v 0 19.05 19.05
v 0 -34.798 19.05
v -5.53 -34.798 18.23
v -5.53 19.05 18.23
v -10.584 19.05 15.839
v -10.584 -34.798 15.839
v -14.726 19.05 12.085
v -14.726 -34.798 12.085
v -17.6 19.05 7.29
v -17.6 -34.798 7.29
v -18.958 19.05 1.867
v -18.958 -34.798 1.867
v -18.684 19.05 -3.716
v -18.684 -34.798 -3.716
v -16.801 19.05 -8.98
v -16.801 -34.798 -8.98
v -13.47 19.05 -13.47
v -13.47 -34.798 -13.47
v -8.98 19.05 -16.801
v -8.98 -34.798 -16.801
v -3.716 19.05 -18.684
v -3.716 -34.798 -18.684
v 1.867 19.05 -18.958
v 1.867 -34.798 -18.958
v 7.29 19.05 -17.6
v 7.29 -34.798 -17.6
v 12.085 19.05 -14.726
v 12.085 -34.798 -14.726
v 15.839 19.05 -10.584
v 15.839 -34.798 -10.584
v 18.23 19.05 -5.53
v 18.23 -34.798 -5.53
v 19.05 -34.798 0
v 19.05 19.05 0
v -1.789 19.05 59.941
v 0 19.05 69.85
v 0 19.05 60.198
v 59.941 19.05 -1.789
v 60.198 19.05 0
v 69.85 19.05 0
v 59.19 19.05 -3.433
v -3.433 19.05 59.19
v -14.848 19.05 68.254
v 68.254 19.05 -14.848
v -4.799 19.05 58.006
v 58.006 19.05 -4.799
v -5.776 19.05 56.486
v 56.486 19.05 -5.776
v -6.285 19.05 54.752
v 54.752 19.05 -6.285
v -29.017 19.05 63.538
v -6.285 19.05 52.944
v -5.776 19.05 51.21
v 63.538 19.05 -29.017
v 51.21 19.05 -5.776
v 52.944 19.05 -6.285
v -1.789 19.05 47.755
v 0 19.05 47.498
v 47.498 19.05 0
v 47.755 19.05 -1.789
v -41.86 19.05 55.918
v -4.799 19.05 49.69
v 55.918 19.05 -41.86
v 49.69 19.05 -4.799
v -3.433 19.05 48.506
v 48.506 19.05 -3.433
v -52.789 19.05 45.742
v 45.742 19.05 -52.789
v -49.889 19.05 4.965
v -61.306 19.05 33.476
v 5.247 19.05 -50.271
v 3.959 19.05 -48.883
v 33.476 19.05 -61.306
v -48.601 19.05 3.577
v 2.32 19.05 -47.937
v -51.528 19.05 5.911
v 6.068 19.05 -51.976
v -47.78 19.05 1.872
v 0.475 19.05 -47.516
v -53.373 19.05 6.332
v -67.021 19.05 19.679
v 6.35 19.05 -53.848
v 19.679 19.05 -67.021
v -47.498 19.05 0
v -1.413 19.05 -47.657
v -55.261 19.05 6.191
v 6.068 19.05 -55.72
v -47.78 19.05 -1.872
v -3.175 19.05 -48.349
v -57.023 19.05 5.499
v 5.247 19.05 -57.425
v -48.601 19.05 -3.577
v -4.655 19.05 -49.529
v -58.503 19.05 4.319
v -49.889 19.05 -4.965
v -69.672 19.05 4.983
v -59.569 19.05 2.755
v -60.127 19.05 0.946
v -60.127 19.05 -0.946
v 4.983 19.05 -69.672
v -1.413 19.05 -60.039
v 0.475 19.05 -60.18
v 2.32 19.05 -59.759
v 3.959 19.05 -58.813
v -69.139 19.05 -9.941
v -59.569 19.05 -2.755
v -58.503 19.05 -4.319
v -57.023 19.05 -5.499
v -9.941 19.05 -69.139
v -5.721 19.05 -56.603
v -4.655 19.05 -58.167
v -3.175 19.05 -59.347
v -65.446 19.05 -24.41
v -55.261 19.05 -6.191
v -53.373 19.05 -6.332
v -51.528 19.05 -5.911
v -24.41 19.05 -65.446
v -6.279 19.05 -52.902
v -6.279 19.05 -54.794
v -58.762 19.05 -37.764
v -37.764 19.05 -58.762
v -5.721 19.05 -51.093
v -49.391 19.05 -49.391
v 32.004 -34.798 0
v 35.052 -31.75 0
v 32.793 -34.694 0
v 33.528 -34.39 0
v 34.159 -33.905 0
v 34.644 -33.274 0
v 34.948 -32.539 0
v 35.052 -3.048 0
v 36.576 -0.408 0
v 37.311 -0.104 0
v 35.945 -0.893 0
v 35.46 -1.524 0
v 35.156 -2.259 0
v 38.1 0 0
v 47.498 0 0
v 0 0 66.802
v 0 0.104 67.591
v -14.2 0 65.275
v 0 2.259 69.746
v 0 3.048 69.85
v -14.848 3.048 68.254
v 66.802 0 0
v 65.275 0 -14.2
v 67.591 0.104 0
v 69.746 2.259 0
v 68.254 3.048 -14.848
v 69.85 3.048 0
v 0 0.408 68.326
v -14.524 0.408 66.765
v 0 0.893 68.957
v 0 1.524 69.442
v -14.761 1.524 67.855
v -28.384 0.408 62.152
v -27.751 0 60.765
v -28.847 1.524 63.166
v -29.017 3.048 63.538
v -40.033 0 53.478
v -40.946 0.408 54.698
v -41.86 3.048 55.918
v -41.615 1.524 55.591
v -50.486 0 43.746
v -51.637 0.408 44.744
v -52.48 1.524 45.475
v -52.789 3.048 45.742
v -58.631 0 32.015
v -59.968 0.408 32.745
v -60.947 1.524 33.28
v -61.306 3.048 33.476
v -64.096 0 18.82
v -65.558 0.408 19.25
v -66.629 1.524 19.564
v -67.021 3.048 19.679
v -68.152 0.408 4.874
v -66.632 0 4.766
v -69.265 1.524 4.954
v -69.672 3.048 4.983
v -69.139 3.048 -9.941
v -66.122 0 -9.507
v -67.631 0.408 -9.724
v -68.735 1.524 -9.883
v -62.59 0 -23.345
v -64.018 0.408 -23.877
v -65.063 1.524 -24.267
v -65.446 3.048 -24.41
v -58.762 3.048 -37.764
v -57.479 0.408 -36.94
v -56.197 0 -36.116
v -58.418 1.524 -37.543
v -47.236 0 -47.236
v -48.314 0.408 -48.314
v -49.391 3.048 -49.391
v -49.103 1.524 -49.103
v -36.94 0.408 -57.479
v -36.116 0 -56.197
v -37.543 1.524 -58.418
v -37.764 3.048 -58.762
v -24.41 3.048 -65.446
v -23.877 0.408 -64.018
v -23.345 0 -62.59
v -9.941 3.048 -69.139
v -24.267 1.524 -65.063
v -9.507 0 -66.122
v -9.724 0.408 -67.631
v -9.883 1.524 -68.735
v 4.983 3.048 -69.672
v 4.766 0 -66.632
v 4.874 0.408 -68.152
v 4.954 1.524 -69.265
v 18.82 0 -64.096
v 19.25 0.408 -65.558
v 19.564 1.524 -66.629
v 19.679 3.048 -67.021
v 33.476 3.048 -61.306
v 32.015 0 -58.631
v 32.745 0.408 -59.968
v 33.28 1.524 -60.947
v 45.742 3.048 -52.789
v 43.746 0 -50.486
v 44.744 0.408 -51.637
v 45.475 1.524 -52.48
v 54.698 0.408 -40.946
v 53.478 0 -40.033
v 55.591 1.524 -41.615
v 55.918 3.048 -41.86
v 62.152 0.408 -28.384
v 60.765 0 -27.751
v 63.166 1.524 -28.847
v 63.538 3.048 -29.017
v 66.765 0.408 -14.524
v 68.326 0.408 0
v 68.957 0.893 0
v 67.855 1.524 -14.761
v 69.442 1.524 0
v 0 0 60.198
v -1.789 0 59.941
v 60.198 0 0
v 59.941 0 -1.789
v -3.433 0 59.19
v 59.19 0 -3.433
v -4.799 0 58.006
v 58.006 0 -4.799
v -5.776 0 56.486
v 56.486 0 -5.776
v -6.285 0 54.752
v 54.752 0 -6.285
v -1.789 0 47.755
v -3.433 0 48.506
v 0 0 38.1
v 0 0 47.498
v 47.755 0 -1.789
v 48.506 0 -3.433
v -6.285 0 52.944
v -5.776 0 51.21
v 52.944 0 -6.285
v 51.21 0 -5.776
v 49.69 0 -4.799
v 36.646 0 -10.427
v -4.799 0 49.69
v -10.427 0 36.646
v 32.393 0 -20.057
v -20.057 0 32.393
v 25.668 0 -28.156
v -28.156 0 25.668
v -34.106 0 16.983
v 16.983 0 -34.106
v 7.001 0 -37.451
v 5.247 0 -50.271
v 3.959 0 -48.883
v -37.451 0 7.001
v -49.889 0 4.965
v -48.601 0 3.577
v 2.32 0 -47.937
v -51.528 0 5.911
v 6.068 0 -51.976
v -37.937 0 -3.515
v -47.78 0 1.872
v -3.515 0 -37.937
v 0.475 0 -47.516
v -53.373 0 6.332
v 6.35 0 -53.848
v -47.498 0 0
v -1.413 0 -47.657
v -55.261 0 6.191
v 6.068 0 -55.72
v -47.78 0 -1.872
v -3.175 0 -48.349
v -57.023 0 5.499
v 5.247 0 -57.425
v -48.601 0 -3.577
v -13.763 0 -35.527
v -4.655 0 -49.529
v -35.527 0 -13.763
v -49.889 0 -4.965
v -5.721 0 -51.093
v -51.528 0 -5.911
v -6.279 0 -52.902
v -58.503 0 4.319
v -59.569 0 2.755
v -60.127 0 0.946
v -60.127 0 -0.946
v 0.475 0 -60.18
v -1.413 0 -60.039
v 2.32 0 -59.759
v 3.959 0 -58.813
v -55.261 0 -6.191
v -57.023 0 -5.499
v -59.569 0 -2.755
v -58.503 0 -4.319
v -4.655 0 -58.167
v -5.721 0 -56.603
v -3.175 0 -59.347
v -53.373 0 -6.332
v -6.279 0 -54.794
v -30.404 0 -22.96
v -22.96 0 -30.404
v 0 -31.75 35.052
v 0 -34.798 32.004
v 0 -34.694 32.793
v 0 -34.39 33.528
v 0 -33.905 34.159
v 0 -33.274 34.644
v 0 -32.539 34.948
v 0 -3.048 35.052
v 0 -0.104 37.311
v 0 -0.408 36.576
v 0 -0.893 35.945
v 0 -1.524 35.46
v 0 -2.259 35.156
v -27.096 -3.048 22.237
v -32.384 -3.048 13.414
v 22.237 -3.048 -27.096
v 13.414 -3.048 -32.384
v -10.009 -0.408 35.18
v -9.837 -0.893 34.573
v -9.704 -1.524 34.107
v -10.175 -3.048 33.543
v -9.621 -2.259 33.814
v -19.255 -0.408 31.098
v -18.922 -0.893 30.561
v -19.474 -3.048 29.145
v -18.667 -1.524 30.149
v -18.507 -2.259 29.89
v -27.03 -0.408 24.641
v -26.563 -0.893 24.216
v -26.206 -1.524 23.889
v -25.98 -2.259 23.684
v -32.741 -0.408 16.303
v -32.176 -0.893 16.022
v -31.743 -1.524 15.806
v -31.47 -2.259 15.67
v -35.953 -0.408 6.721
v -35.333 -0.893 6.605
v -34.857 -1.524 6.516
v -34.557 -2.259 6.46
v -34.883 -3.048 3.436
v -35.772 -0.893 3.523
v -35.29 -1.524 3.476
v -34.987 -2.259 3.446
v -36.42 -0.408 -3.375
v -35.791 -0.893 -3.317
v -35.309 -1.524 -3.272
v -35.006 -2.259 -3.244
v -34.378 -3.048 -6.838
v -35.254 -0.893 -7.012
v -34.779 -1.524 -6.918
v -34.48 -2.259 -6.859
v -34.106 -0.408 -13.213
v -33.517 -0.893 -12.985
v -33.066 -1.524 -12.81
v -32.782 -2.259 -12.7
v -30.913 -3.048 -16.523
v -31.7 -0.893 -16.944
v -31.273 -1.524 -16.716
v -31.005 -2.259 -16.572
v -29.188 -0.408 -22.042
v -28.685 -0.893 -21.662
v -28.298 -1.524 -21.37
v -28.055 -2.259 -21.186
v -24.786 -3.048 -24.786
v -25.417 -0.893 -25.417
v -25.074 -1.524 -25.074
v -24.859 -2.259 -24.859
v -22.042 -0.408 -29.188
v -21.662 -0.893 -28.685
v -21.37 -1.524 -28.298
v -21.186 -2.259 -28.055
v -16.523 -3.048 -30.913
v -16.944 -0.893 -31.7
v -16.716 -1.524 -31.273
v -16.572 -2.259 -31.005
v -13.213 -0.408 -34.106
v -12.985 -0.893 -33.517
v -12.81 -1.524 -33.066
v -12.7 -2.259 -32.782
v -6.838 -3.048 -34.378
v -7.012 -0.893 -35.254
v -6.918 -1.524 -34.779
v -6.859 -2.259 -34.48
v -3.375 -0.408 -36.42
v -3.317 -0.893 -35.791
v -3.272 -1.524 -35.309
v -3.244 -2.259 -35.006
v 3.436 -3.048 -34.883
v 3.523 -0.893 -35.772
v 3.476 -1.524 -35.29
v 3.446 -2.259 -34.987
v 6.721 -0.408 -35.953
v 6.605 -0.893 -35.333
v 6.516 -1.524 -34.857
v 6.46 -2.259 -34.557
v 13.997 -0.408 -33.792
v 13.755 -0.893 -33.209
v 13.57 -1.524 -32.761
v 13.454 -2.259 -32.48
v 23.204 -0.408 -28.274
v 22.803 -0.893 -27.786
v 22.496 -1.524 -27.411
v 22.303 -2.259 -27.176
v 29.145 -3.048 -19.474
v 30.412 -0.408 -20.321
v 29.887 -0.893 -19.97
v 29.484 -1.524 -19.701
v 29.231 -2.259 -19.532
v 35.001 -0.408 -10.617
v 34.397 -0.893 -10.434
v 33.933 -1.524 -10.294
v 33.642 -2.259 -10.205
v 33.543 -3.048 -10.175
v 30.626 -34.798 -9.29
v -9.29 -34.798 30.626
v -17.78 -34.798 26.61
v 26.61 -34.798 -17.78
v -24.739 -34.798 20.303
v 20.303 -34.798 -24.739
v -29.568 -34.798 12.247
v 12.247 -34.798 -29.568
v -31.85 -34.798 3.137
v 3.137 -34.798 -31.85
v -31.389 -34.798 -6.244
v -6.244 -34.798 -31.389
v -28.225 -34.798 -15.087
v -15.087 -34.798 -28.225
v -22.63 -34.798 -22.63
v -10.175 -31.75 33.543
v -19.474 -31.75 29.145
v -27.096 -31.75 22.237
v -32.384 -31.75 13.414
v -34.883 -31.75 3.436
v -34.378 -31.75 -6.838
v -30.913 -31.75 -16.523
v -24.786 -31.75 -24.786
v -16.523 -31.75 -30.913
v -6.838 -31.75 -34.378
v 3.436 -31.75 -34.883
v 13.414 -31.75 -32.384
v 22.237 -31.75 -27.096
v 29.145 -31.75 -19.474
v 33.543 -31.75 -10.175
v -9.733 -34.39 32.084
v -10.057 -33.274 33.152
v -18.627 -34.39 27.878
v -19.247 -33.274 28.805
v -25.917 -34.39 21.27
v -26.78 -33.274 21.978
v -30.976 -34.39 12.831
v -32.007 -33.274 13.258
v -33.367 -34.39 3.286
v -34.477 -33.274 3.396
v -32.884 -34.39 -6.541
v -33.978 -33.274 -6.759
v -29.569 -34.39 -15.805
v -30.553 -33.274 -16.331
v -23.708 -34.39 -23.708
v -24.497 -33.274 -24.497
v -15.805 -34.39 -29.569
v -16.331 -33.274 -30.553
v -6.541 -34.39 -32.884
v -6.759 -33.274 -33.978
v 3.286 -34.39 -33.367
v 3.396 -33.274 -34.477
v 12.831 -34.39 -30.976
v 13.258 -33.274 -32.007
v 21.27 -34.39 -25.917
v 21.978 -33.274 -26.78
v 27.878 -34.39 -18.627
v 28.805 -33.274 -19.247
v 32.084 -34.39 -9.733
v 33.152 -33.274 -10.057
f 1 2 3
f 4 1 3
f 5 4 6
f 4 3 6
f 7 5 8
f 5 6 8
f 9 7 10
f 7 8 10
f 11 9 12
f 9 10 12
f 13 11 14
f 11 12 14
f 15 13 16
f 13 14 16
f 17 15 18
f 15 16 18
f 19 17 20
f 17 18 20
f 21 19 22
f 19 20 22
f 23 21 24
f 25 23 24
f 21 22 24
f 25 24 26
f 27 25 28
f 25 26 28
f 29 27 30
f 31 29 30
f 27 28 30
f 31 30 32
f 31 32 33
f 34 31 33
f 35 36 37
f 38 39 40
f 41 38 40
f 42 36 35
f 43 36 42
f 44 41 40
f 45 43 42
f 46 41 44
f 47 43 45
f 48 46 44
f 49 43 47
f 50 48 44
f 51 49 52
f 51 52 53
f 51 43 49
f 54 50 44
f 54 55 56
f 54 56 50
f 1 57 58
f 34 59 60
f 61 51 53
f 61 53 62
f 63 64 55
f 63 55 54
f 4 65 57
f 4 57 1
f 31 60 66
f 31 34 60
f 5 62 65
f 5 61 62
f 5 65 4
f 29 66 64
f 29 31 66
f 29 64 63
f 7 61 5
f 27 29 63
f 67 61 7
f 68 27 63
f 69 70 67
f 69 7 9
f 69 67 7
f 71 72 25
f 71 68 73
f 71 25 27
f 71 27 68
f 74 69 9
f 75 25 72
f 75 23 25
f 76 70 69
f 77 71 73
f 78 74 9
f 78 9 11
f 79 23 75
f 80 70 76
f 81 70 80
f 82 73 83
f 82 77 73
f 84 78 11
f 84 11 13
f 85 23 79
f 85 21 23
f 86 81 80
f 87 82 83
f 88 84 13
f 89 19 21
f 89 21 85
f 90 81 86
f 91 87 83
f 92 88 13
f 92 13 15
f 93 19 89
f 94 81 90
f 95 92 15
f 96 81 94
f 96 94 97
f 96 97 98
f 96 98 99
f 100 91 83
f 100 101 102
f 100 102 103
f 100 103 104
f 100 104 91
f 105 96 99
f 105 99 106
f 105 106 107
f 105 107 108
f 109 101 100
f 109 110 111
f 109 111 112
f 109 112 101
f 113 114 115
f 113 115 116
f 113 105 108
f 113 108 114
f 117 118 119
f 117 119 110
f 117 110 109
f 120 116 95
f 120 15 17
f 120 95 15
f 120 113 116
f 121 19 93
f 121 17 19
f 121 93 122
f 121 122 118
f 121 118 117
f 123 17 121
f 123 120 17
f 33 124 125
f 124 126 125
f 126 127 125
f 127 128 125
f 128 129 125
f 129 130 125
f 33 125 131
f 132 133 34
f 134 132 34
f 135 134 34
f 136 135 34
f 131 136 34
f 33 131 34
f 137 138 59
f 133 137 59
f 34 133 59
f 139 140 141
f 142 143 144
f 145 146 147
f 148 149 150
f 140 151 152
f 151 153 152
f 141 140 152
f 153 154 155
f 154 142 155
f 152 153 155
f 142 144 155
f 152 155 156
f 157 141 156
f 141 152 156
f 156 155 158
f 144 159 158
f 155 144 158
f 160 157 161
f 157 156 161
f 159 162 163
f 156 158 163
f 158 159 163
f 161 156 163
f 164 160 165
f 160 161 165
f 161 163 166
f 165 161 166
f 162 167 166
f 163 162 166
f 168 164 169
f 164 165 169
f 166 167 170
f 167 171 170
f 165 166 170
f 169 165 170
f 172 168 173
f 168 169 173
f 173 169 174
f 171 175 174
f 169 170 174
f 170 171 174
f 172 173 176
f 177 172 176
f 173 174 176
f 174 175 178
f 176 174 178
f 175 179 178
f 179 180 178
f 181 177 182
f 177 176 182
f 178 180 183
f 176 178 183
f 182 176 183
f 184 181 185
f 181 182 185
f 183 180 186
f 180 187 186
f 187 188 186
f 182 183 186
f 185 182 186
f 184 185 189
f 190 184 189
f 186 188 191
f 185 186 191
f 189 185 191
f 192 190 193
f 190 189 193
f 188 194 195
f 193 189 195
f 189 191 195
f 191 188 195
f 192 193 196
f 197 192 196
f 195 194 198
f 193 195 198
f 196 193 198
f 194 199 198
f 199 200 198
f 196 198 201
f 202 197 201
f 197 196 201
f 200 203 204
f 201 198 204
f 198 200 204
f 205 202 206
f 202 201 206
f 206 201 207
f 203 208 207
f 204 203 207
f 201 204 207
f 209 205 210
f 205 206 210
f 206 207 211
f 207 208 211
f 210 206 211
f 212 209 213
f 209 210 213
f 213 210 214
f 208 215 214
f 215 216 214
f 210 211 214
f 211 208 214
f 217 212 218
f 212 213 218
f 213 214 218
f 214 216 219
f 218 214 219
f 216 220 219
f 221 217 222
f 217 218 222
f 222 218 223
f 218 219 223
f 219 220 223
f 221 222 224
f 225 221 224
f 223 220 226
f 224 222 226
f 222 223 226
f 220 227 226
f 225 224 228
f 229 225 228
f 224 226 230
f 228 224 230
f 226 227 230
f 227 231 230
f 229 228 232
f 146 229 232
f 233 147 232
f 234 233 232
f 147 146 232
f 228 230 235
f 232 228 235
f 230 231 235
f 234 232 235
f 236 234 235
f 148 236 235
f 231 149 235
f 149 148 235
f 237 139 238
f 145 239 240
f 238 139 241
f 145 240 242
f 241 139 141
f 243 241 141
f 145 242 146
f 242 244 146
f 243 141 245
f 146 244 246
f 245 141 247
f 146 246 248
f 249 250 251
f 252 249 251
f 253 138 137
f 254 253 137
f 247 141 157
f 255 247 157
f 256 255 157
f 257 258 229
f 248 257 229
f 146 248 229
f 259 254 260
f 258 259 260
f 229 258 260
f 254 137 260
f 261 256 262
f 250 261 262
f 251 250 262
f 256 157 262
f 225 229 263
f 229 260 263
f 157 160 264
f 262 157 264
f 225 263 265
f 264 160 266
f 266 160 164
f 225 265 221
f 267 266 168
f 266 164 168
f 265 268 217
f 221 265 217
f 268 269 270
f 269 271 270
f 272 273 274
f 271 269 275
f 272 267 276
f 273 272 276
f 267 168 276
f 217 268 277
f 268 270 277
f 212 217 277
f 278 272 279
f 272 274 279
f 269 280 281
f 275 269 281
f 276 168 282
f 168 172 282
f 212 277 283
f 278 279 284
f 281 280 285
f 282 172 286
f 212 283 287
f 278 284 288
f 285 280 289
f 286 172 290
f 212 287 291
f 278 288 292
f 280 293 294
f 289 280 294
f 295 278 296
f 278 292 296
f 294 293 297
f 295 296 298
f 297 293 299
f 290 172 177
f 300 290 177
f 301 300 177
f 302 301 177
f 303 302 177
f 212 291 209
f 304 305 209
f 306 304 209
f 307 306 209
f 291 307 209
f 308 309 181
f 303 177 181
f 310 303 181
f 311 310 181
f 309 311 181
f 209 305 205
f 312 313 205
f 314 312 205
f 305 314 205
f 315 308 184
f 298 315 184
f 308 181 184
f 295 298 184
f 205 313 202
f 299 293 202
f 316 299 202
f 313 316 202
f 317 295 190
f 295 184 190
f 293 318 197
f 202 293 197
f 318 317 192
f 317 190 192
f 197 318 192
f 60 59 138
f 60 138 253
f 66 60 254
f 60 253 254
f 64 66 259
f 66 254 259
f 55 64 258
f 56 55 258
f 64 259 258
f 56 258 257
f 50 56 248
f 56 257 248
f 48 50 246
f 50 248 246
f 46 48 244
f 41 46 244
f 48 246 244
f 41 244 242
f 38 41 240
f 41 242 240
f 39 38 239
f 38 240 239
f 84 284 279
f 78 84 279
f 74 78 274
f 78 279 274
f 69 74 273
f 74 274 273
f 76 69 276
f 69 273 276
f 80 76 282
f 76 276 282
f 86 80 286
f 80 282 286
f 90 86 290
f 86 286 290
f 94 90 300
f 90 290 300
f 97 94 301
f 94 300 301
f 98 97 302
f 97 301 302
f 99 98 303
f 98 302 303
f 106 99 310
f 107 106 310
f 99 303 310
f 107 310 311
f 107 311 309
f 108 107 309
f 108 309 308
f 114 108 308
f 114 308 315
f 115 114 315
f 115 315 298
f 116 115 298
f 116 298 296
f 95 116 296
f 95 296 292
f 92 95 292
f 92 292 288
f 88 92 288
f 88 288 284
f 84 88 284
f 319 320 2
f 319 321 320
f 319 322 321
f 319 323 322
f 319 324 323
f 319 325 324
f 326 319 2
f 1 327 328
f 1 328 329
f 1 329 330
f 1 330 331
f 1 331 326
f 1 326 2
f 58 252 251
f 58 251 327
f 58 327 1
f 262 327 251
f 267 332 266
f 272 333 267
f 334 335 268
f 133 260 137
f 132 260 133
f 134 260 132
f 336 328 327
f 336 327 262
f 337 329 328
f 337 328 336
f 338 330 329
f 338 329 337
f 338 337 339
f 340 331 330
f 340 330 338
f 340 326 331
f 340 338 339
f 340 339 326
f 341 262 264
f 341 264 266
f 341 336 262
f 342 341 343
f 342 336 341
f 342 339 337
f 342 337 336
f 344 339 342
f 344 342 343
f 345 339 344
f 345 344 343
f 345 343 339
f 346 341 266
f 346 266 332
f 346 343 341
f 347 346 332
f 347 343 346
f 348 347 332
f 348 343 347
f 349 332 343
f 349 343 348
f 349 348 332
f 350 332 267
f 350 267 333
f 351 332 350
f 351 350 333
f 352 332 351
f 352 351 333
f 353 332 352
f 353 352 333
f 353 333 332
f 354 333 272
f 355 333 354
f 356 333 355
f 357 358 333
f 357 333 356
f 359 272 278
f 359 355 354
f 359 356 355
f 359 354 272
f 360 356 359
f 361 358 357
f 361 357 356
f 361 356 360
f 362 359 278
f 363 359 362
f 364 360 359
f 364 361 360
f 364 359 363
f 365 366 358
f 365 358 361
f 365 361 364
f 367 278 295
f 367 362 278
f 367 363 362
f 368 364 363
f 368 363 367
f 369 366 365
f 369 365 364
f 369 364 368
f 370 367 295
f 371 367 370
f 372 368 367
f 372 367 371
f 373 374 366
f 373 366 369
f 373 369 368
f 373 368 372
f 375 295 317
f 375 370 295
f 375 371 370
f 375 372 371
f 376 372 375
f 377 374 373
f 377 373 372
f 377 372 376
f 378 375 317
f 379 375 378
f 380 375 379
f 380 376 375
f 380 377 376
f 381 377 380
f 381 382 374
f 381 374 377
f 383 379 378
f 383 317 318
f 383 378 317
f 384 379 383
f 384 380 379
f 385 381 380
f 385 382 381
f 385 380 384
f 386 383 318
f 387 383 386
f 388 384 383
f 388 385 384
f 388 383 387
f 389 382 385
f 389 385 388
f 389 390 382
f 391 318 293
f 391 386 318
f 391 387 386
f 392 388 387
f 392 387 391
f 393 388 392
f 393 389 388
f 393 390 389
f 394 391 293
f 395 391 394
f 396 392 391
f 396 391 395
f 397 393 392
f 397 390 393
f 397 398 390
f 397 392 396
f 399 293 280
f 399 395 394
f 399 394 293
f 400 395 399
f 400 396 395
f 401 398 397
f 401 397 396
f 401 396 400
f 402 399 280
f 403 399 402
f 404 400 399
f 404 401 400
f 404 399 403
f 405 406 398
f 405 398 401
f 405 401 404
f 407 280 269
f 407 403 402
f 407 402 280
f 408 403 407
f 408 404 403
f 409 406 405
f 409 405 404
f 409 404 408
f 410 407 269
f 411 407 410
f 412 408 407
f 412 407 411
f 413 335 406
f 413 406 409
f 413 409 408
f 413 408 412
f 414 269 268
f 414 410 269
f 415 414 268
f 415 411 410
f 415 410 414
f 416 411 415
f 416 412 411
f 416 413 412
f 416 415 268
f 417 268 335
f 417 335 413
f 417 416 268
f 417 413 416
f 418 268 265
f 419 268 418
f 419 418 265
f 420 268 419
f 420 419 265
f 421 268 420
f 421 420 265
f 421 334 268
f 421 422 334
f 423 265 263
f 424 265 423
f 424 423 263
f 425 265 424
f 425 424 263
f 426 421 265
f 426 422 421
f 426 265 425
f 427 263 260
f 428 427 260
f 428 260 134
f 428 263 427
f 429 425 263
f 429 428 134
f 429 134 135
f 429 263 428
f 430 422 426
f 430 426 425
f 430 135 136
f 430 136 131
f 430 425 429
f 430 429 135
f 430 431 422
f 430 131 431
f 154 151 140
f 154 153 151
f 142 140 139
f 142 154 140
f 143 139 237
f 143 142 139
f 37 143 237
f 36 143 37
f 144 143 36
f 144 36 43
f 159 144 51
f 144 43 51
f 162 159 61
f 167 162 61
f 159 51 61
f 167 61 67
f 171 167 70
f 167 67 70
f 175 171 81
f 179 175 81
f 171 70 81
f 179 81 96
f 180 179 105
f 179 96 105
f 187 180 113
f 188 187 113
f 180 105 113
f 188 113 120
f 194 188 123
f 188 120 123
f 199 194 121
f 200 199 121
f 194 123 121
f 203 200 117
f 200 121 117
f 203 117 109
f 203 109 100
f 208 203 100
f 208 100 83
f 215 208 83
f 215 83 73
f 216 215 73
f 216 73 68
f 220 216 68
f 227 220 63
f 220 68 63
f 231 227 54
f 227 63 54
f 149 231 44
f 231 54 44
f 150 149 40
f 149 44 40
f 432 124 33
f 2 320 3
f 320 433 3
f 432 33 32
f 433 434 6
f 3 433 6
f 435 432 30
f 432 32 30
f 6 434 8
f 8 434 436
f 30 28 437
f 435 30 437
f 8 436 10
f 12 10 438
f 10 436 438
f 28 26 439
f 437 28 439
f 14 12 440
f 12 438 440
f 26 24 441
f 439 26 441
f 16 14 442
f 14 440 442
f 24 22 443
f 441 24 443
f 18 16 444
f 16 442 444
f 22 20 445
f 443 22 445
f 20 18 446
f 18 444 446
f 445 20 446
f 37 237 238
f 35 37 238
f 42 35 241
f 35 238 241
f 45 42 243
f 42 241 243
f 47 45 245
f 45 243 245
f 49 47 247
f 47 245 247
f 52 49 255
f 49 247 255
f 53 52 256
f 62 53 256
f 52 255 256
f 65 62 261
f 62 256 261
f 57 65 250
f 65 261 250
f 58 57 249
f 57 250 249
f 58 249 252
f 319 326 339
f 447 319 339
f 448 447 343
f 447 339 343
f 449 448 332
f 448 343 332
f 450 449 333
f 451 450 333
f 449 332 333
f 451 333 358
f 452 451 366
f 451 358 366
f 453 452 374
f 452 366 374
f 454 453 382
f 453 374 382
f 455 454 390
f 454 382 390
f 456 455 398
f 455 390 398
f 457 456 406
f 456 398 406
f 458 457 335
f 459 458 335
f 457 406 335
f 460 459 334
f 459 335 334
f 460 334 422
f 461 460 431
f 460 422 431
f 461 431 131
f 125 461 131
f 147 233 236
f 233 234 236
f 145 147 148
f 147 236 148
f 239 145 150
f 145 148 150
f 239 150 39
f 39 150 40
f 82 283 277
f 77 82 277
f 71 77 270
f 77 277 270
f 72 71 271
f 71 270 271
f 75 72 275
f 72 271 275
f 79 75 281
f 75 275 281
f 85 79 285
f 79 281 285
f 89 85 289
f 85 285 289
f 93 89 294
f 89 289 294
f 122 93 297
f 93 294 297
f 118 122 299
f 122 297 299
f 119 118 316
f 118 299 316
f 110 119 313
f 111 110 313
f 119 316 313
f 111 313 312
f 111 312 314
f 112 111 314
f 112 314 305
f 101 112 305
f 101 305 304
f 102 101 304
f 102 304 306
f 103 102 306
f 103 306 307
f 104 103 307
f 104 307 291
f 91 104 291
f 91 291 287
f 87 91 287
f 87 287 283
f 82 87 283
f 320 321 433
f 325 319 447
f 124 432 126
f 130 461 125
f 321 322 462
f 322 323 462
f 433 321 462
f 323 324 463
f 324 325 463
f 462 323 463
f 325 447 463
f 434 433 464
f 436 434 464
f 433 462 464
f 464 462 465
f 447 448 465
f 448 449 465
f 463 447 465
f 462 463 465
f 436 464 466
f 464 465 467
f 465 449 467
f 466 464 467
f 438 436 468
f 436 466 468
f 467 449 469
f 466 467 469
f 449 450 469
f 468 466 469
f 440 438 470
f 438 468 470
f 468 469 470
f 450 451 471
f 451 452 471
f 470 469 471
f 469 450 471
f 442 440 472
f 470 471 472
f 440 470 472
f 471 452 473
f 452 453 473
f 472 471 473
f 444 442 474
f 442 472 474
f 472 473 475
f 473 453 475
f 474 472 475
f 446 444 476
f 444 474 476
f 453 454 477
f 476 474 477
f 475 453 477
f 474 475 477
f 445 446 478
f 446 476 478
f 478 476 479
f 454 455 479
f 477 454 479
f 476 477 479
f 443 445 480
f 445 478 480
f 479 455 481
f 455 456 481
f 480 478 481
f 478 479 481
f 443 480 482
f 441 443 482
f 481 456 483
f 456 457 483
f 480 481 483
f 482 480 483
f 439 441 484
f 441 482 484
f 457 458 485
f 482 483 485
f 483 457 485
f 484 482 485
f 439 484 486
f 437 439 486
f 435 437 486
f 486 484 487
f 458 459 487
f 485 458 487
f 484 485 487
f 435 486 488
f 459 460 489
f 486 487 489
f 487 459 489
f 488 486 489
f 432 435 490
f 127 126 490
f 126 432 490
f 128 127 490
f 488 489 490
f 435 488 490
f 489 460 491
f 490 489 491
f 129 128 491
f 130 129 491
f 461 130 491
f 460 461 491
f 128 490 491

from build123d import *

# Parameters (mm, degrees)
F0_W     = 19.05
F0_H     = 69.85
F1_ANGLE = -270
F2_R     = 3.048
F3_W     = 34.798
F3_H     = 35.052
F4_ANGLE = 270
F5_R     = 3.048
F6_R     = 19.05
F7_DEPTH = 53.849
F8_R     = 6.35
F9_DEPTH = 19.051


with BuildPart() as f1:
    # F0 (on Right) → F1 (revolve)
    with BuildSketch(Plane.YZ):
        with Locations((9.525, 34.925)):
            Rectangle(F0_W, F0_H)
    revolve(axis=Axis((0, 9.525, 0), (0, 1, 0)), revolution_arc=F1_ANGLE)

    # F2
    f2_edges = [f1.edges().sort_by_distance(p)[0] for p in [
        (-49.391409, 0, -49.391409),
    ]]
    fillet(f2_edges, radius=F2_R)

    # F3 (on Right) → F4 (revolve)
    with BuildSketch(Plane.YZ):
        with Locations((-17.399, 17.526)):
            Rectangle(F3_W, F3_H)
    revolve(axis=Axis((0, -17.399, 0), (0, -1, 0)), revolution_arc=F4_ANGLE)

    # F5
    f5_edges = [f1.edges().sort_by_distance(p)[0] for p in [
        (-24.785507, -34.798, -24.785507),
        (-24.785507, 0, -24.785507),
    ]]
    fillet(f5_edges, radius=F5_R)

    # F6 (on face) → F7 (cut, through all)
    with BuildSketch(Plane.XZ.offset(34.798)):
        Circle(F6_R)
    extrude(amount=-F7_DEPTH, mode=Mode.SUBTRACT)

    # F8 (on Front) → F9 (cut, through all)
    with BuildSketch(Plane.XZ):
        with Locations((0, 53.848)):
            Circle(F8_R)
        with Locations((-53.848, 0)):
            Circle(F8_R)
        with Locations((0, -53.848)):
            Circle(F8_R)
        with Locations((53.848, 0)):
            Circle(F8_R)
    extrude(amount=-F9_DEPTH, mode=Mode.SUBTRACT)


solid = f1.part
